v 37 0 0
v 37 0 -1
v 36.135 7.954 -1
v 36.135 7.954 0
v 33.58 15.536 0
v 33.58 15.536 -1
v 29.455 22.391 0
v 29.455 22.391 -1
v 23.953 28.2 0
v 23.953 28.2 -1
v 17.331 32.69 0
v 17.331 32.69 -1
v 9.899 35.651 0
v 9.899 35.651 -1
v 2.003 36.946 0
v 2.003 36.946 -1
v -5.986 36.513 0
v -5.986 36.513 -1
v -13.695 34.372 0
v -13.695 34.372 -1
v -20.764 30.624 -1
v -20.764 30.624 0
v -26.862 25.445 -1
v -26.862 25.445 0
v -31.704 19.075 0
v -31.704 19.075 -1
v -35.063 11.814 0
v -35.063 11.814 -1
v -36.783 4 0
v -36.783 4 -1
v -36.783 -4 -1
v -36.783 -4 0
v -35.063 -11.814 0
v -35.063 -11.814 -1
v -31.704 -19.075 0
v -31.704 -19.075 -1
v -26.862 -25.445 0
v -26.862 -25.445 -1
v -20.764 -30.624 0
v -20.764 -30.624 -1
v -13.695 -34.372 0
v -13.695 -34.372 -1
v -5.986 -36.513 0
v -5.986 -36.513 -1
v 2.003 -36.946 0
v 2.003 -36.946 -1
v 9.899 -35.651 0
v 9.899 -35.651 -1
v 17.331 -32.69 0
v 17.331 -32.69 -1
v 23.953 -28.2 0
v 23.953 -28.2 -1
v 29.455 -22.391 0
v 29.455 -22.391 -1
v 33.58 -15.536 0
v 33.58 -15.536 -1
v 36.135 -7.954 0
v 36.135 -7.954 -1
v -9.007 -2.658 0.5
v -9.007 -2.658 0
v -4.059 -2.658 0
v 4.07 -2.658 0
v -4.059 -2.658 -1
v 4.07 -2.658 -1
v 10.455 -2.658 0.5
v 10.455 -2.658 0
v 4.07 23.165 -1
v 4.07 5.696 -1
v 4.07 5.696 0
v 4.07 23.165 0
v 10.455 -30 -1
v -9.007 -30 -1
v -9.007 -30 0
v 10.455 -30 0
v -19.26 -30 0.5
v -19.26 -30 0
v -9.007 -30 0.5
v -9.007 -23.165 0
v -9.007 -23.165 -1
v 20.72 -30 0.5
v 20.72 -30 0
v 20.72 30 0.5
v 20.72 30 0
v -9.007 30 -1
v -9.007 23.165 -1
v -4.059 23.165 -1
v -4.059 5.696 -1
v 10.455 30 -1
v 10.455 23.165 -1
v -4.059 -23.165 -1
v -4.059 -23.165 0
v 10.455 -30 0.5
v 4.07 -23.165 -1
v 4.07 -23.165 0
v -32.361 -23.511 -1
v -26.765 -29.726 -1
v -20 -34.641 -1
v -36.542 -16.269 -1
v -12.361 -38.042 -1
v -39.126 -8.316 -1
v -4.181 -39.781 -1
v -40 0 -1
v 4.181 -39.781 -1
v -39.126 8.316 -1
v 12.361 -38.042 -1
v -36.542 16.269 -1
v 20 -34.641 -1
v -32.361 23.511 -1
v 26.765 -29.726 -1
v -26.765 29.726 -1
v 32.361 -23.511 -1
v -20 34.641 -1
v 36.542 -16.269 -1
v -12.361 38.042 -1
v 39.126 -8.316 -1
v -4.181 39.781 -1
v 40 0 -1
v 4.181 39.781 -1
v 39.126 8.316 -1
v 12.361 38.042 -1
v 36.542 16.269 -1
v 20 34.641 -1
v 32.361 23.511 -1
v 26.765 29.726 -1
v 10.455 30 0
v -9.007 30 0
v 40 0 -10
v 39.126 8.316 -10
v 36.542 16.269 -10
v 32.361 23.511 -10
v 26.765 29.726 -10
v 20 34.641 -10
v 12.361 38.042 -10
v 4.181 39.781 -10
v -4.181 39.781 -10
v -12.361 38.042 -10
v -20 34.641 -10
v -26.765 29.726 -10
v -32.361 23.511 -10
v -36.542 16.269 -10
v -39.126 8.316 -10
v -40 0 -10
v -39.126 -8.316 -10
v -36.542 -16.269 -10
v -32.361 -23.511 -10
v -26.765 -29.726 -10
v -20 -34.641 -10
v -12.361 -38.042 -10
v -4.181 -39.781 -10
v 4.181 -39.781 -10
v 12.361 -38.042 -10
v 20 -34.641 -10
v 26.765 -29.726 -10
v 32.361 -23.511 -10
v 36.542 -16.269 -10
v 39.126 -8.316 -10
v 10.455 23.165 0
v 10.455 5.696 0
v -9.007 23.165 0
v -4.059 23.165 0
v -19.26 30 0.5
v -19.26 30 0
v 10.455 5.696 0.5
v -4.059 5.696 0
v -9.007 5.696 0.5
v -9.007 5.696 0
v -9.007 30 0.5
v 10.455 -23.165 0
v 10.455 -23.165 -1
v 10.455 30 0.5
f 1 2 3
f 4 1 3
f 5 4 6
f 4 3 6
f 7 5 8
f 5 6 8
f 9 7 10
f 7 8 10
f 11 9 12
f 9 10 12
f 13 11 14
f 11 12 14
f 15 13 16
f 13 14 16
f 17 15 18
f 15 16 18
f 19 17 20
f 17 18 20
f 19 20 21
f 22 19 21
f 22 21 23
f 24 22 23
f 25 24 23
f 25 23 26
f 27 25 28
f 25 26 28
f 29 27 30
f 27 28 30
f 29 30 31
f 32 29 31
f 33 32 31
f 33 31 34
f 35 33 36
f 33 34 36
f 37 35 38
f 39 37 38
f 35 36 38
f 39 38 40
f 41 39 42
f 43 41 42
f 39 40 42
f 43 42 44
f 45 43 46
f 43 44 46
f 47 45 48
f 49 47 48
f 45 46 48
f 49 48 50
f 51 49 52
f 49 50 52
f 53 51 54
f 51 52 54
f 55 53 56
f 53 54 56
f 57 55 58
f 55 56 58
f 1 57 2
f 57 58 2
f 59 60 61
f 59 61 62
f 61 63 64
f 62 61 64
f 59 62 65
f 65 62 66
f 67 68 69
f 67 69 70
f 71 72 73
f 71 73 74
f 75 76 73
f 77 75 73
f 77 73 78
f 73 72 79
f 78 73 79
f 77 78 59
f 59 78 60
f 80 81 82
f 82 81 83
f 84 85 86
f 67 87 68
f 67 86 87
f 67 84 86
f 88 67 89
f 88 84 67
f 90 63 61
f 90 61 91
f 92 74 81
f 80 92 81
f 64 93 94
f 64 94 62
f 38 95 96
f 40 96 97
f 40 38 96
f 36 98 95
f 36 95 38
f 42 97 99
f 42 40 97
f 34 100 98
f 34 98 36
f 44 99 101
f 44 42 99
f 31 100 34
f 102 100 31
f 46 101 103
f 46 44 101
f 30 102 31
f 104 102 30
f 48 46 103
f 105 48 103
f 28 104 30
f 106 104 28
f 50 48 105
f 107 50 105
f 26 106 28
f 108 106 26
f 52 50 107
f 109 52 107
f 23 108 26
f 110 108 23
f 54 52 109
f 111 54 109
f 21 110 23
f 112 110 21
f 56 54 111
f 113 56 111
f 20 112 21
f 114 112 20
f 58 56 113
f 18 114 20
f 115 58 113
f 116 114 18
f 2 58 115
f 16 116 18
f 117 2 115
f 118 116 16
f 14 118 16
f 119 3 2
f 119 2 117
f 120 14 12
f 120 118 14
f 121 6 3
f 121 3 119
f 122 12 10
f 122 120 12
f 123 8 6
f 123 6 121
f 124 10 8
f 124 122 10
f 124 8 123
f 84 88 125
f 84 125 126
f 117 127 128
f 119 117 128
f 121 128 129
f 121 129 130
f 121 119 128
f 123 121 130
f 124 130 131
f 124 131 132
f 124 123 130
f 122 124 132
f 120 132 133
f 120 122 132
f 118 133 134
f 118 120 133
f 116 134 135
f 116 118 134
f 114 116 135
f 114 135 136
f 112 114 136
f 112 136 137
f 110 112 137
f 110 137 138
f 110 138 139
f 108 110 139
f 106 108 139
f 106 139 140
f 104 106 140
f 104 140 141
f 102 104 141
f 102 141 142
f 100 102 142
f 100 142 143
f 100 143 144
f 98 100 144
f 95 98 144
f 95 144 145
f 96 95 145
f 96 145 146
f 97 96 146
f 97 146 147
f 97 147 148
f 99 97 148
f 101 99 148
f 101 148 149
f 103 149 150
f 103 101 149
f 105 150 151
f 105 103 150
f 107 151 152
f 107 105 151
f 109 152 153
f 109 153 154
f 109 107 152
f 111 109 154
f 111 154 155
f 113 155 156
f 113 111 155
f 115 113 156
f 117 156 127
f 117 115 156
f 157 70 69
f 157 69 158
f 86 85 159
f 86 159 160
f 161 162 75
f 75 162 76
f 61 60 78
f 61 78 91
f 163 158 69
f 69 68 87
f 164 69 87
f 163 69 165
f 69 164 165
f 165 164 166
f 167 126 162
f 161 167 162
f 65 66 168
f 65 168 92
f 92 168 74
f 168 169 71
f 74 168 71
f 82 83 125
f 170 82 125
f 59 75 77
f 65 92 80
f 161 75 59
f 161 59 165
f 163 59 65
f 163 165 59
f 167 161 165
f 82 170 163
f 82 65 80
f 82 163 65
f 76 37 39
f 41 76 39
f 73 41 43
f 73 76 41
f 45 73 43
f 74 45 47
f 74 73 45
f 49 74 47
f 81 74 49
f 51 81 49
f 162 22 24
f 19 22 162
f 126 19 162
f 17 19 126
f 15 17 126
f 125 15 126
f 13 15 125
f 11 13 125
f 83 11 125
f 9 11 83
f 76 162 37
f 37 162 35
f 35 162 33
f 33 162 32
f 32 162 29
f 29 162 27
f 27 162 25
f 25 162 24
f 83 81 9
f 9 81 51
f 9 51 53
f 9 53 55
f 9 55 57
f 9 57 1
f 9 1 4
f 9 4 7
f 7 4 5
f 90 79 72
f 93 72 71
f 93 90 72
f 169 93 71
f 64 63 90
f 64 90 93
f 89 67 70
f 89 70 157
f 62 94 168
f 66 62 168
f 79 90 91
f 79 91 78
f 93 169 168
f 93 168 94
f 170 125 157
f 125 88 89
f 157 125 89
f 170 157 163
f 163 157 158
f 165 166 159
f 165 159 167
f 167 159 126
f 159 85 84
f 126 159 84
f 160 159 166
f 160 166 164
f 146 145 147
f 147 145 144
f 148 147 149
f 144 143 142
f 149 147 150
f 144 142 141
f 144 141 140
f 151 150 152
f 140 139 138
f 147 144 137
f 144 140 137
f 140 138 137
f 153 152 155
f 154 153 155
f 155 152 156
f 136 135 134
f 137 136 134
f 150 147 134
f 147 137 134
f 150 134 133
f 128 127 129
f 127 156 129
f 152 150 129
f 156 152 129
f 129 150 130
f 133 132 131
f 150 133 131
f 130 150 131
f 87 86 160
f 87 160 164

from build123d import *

# Parameters (mm, degrees)
SKETCH2_R                = 40
BOSS_EXTRUDE1_DEPTH      = 10
CUT_EXTRUDE1_START       = -1
CUT_EXTRUDE1_OUTLINE_R   = 40
CUT_EXTRUDE1_OUTLINE_R_2 = 37
CUT_EXTRUDE1_DEPTH       = 1
CUT_EXTRUDE1_2_DEPTH     = 0.5


# Read off the part's stored shape, not the designer's step: Cut-Extrude1
with BuildPart() as part:
    # Sketch2 → Boss-Extrude1 (new body)
    with BuildSketch(Plane.XY):
        Circle(SKETCH2_R)
    extrude(amount=-BOSS_EXTRUDE1_DEPTH)

    # Cut-Extrude1 outline → Cut-Extrude1 (cut)
    # profile 1 of 3: a face of its own
    with BuildSketch(Plane.XY.offset(CUT_EXTRUDE1_START)):
        Circle(CUT_EXTRUDE1_OUTLINE_R)
        Circle(CUT_EXTRUDE1_OUTLINE_R_2, mode=Mode.SUBTRACT)
    # profile 2 of 3: a face of its own
    with BuildSketch(Plane.XY.offset(CUT_EXTRUDE1_START)):
        Polygon((-9.007120253, -30), (10.454905063, -30), (10.454905063, -23.164556962), (4.070411392, -23.164556962), (4.070411392, -2.658227848), (-4.058544304, -2.658227848), (-4.058544304, -23.164556962), (-9.007120253, -23.164556962), align=None)
    # profile 3 of 3: a face of its own
    with BuildSketch(Plane.XY.offset(CUT_EXTRUDE1_START)):
        Polygon((-4.058544304, 5.696202532), (4.070411392, 5.696202532), (4.070411392, 23.164556962), (10.454905063, 23.164556962), (10.454905063, 30), (-9.007120253, 30), (-9.007120253, 23.164556962), (-4.058544304, 23.164556962), align=None)
    extrude(amount=CUT_EXTRUDE1_DEPTH, mode=Mode.SUBTRACT)

    # Cut-Extrude1 2 outline → Cut-Extrude1 2 (add)
    with BuildSketch(Plane.XY):
        Polygon((10.454905063, 30), (10.454905063, 5.696202532), (-9.007120253, 5.696202532), (-9.007120253, 30), (-19.26028481, 30), (-19.26028481, -30), (-9.007120253, -30), (-9.007120253, -2.658227848), (10.454905063, -2.658227848), (10.454905063, -30), (20.719936709, -30), (20.719936709, 30), align=None)
    extrude(amount=CUT_EXTRUDE1_2_DEPTH)


solid = part.part
